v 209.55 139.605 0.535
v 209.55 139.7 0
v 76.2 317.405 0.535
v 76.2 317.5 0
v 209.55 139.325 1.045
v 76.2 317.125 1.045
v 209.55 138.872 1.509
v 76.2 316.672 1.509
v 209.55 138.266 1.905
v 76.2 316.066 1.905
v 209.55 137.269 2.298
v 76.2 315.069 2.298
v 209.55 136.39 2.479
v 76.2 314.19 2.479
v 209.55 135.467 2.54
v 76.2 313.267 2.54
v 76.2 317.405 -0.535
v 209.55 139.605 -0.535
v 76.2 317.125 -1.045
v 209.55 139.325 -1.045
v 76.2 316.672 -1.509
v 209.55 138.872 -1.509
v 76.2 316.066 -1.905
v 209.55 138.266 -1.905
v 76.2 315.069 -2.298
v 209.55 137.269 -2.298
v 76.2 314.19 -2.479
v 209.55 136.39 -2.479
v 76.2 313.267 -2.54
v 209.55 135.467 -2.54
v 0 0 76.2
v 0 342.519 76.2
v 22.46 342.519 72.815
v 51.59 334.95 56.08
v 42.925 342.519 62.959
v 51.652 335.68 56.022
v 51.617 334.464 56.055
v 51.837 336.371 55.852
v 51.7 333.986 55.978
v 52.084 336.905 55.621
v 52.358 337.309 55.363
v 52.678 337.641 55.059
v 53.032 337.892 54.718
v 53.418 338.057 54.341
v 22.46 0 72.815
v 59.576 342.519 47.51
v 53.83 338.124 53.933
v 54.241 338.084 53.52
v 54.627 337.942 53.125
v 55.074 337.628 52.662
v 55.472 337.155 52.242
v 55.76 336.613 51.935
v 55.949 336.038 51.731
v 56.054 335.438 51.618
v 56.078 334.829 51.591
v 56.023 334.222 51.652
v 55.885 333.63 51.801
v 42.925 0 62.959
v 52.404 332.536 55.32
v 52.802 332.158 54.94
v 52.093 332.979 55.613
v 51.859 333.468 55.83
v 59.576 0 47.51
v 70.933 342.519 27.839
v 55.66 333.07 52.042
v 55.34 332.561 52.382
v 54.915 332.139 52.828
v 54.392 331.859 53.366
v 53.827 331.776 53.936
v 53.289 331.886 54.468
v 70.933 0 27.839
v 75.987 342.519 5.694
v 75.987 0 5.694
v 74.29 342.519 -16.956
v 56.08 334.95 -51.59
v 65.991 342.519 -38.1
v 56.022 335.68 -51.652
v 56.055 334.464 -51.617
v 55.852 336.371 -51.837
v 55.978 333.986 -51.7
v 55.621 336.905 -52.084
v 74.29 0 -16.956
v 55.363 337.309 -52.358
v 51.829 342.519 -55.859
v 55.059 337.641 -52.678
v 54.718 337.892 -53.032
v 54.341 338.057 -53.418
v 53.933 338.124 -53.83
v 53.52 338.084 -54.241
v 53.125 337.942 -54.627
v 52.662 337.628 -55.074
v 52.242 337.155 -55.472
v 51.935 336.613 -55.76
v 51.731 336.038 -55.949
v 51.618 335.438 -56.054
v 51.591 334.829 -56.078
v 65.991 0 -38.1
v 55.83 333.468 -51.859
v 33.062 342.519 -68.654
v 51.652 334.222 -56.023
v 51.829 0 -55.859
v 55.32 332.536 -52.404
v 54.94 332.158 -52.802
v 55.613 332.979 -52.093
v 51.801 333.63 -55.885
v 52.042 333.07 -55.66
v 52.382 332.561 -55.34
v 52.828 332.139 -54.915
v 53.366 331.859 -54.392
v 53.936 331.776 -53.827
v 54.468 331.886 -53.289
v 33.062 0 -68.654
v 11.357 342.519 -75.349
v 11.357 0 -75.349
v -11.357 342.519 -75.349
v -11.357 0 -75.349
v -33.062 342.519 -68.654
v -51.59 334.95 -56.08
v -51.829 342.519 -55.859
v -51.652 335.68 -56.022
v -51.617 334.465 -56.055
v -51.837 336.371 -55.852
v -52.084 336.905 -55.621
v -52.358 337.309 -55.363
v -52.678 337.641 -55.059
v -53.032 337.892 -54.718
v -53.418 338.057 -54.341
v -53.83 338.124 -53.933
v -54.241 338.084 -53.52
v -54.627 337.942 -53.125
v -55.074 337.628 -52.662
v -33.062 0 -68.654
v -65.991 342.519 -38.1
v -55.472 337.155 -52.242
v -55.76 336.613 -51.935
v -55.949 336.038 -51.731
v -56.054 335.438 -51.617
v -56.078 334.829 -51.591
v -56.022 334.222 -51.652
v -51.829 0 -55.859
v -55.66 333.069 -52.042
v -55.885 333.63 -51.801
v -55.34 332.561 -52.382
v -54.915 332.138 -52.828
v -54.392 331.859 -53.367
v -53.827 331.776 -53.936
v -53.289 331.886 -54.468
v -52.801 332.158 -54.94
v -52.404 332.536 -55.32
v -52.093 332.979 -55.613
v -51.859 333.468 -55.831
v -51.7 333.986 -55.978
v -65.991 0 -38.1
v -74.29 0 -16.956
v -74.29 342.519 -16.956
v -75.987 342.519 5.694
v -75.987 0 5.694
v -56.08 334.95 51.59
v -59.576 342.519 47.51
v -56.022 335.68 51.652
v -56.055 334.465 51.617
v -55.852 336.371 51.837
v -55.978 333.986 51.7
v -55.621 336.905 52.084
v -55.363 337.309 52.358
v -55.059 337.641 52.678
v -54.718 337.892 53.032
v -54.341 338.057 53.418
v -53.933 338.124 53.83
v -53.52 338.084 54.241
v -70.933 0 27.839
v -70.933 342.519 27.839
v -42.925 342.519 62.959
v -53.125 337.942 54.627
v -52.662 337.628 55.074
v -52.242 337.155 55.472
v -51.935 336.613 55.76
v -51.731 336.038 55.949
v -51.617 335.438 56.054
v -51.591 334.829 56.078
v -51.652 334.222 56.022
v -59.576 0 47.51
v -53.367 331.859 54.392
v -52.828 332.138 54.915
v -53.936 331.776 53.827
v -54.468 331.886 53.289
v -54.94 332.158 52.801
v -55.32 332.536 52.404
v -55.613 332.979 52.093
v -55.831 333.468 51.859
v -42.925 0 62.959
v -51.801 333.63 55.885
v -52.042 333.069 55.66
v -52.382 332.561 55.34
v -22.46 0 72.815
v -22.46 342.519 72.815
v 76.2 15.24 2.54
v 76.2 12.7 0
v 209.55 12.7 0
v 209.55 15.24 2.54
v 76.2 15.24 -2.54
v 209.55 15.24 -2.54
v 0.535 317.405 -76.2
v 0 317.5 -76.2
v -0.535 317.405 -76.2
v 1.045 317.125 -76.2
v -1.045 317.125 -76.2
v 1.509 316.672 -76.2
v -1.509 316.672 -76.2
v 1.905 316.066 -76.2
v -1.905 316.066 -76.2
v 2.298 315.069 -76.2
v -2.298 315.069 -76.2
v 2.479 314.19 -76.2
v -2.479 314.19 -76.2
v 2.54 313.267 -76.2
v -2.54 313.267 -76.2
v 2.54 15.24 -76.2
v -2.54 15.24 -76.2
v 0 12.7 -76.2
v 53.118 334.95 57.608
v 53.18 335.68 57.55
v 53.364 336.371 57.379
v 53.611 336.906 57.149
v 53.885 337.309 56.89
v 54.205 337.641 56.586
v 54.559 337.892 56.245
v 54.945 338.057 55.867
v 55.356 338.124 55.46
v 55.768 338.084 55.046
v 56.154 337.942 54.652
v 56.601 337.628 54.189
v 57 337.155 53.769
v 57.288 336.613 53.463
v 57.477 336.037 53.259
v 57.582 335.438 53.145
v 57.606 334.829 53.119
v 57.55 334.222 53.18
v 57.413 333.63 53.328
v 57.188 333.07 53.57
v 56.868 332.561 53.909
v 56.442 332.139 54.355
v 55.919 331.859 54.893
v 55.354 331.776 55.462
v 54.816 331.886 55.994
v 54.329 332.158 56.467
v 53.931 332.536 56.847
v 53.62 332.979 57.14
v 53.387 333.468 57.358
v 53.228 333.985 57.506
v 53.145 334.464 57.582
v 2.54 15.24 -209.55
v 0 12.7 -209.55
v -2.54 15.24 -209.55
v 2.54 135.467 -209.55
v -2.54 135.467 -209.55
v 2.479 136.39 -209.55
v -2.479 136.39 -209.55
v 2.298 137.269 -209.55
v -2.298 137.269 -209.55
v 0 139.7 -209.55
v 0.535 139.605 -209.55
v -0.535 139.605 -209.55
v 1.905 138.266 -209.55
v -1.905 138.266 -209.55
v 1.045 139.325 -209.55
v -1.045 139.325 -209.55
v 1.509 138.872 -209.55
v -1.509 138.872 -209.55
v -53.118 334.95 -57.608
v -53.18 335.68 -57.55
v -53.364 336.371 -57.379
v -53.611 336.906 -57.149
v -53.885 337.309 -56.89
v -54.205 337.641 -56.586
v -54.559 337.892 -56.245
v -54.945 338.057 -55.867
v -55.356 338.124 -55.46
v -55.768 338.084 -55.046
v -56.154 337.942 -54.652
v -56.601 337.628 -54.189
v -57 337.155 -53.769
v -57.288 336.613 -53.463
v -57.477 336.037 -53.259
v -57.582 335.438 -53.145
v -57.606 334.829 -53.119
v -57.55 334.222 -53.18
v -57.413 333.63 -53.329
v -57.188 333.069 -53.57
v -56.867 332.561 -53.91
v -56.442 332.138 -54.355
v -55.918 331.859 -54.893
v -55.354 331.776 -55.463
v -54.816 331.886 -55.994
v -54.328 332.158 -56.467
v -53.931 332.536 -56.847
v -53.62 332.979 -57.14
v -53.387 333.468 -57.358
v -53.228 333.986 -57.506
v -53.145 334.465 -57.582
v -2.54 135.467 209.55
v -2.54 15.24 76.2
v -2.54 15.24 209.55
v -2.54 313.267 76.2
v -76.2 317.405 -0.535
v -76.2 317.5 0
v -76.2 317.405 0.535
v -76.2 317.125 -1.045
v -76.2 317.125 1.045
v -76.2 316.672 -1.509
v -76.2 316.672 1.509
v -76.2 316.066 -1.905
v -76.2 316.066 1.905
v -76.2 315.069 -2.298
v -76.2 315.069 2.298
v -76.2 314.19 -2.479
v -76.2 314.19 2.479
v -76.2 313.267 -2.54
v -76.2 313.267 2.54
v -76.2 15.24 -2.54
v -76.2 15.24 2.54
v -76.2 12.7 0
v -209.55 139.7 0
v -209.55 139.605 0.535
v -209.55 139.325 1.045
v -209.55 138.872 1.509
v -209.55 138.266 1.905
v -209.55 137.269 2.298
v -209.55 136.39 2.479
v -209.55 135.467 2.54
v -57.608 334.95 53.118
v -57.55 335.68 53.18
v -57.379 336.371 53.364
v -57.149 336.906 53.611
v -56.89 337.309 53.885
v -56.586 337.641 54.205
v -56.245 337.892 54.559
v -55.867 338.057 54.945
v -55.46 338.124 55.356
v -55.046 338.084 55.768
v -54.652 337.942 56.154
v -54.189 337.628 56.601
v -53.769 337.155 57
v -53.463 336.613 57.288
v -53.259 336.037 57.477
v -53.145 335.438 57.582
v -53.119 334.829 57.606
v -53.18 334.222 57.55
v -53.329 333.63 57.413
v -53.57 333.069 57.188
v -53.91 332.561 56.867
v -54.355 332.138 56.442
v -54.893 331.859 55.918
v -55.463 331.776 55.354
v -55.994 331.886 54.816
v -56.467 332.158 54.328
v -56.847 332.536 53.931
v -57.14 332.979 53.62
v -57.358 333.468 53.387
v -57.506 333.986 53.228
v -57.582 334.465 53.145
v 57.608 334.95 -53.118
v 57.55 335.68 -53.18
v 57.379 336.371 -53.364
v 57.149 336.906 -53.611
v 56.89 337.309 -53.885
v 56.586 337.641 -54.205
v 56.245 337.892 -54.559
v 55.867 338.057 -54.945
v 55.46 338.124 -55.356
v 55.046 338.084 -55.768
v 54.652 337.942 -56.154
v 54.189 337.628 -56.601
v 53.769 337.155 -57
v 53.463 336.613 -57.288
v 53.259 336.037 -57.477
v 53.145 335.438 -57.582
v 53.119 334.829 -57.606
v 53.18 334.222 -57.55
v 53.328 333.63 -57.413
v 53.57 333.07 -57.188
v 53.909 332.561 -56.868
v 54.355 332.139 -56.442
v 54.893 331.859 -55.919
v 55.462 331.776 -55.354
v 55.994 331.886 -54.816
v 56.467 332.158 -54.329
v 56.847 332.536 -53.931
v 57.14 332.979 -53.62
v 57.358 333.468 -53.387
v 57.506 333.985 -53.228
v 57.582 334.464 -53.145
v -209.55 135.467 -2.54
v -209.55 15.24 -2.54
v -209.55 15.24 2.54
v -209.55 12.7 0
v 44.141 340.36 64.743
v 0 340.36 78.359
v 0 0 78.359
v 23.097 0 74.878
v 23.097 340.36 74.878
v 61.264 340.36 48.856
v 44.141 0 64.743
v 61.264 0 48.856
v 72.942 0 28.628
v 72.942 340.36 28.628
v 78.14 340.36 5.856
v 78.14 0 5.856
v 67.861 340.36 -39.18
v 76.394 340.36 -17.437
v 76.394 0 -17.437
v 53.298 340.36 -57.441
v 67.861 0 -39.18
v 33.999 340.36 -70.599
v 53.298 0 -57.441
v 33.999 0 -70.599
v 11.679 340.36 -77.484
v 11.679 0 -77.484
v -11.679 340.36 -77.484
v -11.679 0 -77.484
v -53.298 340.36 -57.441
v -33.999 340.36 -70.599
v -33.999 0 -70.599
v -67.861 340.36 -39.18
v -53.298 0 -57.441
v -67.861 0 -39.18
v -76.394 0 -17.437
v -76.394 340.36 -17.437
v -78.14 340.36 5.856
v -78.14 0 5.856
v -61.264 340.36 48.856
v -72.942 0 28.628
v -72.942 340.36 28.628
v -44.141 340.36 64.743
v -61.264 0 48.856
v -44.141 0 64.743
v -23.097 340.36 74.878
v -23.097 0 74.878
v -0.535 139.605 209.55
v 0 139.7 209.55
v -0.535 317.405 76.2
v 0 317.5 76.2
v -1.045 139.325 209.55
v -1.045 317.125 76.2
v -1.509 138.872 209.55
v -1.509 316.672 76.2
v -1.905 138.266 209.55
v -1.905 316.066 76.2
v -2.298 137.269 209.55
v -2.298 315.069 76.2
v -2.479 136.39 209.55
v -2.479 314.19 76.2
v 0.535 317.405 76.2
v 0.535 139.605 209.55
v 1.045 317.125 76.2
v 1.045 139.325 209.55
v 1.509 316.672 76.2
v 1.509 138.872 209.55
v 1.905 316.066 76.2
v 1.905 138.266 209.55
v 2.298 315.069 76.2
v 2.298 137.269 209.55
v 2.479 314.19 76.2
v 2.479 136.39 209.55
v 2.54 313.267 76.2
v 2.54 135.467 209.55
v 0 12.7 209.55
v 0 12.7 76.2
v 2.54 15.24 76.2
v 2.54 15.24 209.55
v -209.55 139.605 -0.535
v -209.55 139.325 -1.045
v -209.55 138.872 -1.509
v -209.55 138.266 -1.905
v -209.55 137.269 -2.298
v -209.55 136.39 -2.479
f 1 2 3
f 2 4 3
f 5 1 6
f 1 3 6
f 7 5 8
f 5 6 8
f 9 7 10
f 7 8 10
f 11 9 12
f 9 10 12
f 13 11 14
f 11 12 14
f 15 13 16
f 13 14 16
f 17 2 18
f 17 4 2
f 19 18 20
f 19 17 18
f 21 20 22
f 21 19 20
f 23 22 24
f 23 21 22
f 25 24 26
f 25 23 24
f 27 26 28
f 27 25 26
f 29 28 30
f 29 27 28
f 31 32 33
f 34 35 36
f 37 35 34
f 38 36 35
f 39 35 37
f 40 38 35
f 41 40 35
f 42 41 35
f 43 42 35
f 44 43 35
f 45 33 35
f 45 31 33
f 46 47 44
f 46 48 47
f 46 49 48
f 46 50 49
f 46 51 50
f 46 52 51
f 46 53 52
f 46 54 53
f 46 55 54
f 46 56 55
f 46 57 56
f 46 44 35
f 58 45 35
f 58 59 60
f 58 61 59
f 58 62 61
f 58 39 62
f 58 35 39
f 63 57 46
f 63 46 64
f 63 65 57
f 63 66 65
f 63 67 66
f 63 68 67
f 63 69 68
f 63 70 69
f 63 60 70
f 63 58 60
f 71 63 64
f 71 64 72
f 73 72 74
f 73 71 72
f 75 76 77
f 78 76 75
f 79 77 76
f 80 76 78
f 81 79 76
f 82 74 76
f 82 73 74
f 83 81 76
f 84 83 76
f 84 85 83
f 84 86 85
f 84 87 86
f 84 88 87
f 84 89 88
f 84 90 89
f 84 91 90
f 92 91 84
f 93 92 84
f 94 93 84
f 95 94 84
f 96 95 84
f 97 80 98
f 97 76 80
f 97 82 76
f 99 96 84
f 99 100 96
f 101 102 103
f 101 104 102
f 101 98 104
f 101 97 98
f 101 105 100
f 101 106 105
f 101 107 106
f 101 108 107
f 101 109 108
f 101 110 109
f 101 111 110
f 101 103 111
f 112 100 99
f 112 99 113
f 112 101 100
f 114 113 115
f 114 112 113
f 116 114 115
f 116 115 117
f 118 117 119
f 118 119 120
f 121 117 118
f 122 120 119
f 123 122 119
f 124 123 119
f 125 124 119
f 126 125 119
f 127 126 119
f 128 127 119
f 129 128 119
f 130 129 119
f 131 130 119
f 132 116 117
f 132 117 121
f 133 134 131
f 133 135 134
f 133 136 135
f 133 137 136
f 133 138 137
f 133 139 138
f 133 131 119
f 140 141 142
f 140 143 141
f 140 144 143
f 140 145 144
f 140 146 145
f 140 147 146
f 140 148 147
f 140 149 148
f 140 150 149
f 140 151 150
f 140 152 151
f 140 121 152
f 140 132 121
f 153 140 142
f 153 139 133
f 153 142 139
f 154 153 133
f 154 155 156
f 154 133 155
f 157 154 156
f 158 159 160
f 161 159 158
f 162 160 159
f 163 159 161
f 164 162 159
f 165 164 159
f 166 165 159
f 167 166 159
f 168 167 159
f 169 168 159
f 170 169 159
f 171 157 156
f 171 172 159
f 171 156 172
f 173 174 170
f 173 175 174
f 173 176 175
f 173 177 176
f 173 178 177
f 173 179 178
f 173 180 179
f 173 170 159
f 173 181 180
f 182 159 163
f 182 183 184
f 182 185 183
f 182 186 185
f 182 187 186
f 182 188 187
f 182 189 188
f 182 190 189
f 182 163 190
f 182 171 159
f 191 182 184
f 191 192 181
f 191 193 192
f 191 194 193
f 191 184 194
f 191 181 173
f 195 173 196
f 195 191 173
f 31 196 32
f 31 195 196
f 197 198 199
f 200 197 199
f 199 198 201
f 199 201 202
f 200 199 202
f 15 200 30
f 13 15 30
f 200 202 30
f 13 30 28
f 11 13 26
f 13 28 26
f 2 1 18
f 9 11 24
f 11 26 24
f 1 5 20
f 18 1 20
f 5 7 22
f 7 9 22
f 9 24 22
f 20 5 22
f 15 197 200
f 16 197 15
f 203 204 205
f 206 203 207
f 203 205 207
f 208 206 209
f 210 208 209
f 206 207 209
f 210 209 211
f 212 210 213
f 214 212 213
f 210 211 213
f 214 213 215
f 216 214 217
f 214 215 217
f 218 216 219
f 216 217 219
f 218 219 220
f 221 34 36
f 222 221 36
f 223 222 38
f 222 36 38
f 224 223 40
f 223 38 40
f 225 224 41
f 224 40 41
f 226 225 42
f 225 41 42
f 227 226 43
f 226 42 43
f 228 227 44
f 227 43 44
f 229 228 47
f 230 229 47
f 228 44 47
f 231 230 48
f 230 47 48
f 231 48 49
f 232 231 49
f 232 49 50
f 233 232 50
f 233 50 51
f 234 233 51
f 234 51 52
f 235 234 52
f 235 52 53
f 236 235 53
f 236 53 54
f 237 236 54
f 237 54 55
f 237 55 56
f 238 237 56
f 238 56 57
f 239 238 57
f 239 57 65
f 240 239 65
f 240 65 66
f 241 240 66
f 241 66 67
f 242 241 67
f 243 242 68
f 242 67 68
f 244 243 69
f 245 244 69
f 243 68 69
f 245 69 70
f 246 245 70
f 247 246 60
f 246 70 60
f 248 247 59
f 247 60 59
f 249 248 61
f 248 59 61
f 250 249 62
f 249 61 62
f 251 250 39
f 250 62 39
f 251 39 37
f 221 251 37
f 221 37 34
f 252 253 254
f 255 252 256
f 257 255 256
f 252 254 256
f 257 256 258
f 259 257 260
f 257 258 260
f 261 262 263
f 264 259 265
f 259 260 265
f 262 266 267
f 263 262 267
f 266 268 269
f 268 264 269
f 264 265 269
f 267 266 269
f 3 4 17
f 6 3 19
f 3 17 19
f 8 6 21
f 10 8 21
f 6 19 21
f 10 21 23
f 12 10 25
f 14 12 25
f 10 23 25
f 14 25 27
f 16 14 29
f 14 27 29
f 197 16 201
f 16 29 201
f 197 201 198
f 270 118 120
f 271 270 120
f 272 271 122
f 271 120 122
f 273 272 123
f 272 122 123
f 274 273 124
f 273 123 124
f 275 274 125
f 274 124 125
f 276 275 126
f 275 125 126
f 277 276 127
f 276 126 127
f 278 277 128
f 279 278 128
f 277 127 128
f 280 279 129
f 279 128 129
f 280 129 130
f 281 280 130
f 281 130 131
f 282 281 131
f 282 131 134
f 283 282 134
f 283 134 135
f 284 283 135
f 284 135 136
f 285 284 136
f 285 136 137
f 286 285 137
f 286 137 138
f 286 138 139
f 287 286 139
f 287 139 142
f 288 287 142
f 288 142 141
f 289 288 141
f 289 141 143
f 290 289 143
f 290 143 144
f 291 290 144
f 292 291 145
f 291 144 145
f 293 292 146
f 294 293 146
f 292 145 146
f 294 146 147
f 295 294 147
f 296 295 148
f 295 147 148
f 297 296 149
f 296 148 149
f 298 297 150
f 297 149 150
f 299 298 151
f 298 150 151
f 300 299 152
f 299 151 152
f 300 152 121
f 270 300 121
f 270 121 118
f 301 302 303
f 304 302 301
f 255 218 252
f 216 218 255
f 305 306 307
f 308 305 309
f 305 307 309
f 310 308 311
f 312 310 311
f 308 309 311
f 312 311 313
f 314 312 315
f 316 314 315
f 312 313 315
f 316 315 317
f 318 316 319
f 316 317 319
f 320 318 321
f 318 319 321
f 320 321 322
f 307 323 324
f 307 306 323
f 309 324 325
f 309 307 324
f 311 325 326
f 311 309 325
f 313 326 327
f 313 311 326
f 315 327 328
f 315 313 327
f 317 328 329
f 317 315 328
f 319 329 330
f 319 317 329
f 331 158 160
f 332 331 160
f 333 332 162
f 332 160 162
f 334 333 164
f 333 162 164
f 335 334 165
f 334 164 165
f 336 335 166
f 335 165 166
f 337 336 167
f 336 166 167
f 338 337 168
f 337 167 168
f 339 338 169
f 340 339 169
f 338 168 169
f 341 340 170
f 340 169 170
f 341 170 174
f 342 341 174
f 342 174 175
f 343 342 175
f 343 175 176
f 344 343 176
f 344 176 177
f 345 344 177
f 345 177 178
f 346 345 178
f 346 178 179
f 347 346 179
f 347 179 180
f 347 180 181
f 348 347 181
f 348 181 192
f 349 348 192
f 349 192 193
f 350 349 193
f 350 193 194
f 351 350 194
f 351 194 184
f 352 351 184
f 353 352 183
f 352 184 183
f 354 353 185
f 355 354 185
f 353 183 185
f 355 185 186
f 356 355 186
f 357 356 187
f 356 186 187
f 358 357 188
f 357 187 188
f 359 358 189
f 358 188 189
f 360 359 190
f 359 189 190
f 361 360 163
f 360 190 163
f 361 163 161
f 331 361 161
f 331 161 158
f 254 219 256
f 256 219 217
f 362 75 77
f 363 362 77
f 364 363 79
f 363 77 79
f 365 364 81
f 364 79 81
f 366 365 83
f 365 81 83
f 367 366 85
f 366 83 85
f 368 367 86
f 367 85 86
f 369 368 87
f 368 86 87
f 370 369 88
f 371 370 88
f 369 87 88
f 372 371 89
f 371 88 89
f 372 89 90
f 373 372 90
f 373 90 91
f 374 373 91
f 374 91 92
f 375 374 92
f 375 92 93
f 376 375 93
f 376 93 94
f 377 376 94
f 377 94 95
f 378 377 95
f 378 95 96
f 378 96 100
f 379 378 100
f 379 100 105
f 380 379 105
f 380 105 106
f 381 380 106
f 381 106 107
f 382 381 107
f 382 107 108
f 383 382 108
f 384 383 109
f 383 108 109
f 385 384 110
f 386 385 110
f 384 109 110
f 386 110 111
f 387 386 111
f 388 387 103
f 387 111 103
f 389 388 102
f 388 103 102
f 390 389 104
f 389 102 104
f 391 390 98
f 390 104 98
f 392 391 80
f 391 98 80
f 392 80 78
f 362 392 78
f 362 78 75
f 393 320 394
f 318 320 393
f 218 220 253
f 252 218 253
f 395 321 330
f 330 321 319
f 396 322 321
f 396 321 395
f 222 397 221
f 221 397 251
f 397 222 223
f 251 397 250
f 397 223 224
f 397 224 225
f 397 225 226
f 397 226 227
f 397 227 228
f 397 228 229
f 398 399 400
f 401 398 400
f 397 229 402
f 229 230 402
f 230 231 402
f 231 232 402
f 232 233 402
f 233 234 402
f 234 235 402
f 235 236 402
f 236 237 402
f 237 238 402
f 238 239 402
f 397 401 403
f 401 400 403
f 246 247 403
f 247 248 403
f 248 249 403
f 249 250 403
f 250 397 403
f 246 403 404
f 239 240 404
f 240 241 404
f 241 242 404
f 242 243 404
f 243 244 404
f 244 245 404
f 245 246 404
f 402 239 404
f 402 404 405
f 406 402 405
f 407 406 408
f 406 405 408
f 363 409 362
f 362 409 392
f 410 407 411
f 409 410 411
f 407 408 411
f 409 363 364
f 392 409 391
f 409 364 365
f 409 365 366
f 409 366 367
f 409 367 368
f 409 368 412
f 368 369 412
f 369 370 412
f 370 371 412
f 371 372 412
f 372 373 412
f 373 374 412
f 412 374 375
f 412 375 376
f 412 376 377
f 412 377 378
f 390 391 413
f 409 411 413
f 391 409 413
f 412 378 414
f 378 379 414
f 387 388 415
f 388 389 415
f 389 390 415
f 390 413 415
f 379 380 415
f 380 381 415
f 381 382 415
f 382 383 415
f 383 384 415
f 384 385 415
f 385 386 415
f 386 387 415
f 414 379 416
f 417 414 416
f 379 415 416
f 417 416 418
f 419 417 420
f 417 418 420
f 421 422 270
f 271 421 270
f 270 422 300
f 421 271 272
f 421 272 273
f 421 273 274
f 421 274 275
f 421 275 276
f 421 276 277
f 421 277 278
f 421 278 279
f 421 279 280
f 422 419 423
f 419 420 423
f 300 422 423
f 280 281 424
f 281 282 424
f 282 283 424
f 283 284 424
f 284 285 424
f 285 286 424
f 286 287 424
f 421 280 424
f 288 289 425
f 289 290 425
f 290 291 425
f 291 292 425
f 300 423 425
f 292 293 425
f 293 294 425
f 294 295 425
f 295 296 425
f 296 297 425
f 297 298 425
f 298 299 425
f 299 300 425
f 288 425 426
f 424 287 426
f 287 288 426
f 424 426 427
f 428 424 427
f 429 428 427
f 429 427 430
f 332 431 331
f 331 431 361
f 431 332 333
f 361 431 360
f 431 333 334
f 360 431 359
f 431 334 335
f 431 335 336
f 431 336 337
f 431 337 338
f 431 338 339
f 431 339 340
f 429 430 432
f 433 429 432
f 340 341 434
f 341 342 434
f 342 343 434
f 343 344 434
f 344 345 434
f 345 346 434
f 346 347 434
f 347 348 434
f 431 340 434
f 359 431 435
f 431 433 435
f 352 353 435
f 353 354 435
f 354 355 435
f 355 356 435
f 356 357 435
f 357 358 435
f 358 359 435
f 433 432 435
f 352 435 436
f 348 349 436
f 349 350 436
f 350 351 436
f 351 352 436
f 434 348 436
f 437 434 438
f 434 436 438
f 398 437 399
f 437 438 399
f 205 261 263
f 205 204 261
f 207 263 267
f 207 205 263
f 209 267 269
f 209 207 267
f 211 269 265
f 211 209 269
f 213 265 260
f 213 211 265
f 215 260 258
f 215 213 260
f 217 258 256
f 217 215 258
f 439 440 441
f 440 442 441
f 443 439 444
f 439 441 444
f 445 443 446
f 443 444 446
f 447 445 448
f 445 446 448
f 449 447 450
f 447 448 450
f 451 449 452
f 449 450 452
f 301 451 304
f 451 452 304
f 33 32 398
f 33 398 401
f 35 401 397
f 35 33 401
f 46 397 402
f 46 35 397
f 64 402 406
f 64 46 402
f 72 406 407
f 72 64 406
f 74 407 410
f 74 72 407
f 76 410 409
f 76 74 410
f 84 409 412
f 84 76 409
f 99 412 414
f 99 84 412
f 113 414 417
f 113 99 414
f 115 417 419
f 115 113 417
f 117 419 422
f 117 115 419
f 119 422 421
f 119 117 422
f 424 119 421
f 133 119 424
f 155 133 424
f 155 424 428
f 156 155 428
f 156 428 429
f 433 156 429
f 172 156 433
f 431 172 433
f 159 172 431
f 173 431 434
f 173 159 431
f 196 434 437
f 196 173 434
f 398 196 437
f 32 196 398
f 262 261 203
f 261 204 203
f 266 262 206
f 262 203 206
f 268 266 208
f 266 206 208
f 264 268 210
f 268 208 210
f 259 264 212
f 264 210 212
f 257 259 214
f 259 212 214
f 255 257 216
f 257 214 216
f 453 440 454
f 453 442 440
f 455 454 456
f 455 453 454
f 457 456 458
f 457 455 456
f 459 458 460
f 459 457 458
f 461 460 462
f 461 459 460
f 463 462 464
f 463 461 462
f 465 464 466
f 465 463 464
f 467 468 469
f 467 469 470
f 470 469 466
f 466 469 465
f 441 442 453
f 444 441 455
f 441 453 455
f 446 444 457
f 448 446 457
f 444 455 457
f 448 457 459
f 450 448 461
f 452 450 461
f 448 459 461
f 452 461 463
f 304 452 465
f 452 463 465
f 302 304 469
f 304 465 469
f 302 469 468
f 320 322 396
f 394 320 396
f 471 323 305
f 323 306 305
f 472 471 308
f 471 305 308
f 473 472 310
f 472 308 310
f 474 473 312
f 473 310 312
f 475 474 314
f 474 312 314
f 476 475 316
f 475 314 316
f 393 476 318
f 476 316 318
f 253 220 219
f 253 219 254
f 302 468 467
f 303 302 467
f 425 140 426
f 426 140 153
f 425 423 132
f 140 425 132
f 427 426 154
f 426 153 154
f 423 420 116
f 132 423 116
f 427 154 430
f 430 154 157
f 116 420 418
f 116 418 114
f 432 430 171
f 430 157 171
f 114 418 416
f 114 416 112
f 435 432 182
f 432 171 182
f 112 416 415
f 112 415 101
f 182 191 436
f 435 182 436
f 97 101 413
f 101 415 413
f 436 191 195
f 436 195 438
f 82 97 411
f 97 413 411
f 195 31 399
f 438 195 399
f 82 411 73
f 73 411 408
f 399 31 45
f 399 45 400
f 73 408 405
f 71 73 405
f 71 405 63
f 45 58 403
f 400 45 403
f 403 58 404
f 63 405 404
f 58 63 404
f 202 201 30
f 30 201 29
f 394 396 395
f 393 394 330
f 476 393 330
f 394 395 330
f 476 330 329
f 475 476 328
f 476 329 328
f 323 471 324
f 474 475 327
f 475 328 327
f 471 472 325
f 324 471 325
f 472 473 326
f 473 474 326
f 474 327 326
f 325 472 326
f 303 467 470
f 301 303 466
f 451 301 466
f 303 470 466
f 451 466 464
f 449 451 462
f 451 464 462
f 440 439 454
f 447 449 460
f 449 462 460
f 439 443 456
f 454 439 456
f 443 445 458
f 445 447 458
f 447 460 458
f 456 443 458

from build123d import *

# Parameters (mm, degrees)
SKETCH1_R                = 78.359
SKETCH1_R_2              = 76.2
BOSS_EXTRUDE1_DEPTH      = 342.9
BOSS_EXTRUDE2_DEPTH      = 2.54
BOSS_EXTRUDE2_DEPTH_BACK = 2.54
FILLET2_R                = 2.54
CHAMFER2_SIZE            = 2.54
CIRPATTERN1_COUNT        = 4
SKETCH4_R                = 3.175
CUT_EXTRUDE1_DEPTH       = 454.213873353
CIRPATTERN2_COUNT        = 4
CHAMFER3_SIZE            = 2.54


# Some blends are built 0.0001 mm under size
with BuildPart() as part:
    # Sketch1 → Boss-Extrude1 (new body)
    with BuildSketch(Plane(origin=(0, 0, 0), x_dir=(1, 0, 0), z_dir=(0, 1, 0))):
        with Locations(Location((0, 0, 0), (0, 0, 270))):
            Circle(SKETCH1_R)
        with Locations(Location((0, 0, 0), (0, 0, 270))):
            Circle(SKETCH1_R_2, mode=Mode.SUBTRACT)
    extrude(amount=BOSS_EXTRUDE1_DEPTH)

    # Sketch4 → Cut-Extrude1 (cut, through all)
    with BuildSketch(Plane(origin=(0, 0, 0), x_dir=(-0.7071067811865462, 0, 0.7071067811865489), z_dir=(-0.7071067811865489, 0, -0.7071067811865462))):
        with Locations((0, 334.9498)):
            Circle(SKETCH4_R)
    cut_extrude1 = extrude(amount=-CUT_EXTRUDE1_DEPTH, mode=Mode.SUBTRACT)

    # CirPattern2: Cut-Extrude1 ×4 about axis
    cirpattern2_axis = Axis((0, -69.284011973, 0), (0, 1, 0))
    for i in range(1, CIRPATTERN2_COUNT):
        add(cut_extrude1.rotate(cirpattern2_axis, i * 360 / CIRPATTERN2_COUNT), mode=Mode.SUBTRACT)

    # Chamfer3
    # the kernel refuses this chamfer: 2.54 mm, written as the material it takes off along each edge
    with BuildSketch(Plane(origin=(0, 342.9, 0), x_dir=(0, 0, 1), z_dir=(-1, 0, 0))) as chamfer3_piece_1:
        Polygon((78.359, -CHAMFER3_SIZE), (78.359 - CHAMFER3_SIZE, 0), (78.359, 0), align=None)
    revolve(axis=Axis((0, 342.9, 0), (0, 1, 0)), mode=Mode.SUBTRACT)


with BuildPart() as body_2:
    # Sketch2 → Boss-Extrude2 (new, two sides: drawn at the far end of the back side and taken through both)
    with BuildSketch(Plane.XY.offset(-BOSS_EXTRUDE2_DEPTH_BACK)):
        Polygon((76.2, 317.5), (76.2, 12.7), (209.55, 12.7), (209.55, 139.7), align=None)
    extrude(amount=BOSS_EXTRUDE2_DEPTH + BOSS_EXTRUDE2_DEPTH_BACK)

    # Fillet2
    fillet2_edges = [body_2.edges().sort_by_distance(p)[0] for p in [
        (142.875, 228.6, -2.54),
        (142.875, 228.6, 2.54),
    ]]
    fillet(fillet2_edges, radius=FILLET2_R - 0.0001)  # a hair under: the kernel refuses the full size

    # Chamfer2
    chamfer2_edges = [body_2.edges().sort_by_distance(p)[0] for p in [
        (142.875, 12.7, -2.54),
        (142.875, 12.7, 2.54),
    ]]
    chamfer(chamfer2_edges, length=CHAMFER2_SIZE - 0.0001)  # a hair under: the kernel refuses the full size


with BuildPart() as cirpattern1_1:
    # CirPattern1: pattern copy
    add(body_2.part.rotate(Axis((0, 0, 0), (0, 1, 0)), 1 * 360 / CIRPATTERN1_COUNT))


with BuildPart() as cirpattern1_2:
    # CirPattern1: pattern copy
    add(body_2.part.rotate(Axis((0, 0, 0), (0, 1, 0)), 2 * 360 / CIRPATTERN1_COUNT))


with BuildPart() as cirpattern1_3:
    # CirPattern1: pattern copy
    add(body_2.part.rotate(Axis((0, 0, 0), (0, 1, 0)), 3 * 360 / CIRPATTERN1_COUNT))


solid = Compound([part.part, body_2.part, cirpattern1_1.part, cirpattern1_2.part, cirpattern1_3.part])
